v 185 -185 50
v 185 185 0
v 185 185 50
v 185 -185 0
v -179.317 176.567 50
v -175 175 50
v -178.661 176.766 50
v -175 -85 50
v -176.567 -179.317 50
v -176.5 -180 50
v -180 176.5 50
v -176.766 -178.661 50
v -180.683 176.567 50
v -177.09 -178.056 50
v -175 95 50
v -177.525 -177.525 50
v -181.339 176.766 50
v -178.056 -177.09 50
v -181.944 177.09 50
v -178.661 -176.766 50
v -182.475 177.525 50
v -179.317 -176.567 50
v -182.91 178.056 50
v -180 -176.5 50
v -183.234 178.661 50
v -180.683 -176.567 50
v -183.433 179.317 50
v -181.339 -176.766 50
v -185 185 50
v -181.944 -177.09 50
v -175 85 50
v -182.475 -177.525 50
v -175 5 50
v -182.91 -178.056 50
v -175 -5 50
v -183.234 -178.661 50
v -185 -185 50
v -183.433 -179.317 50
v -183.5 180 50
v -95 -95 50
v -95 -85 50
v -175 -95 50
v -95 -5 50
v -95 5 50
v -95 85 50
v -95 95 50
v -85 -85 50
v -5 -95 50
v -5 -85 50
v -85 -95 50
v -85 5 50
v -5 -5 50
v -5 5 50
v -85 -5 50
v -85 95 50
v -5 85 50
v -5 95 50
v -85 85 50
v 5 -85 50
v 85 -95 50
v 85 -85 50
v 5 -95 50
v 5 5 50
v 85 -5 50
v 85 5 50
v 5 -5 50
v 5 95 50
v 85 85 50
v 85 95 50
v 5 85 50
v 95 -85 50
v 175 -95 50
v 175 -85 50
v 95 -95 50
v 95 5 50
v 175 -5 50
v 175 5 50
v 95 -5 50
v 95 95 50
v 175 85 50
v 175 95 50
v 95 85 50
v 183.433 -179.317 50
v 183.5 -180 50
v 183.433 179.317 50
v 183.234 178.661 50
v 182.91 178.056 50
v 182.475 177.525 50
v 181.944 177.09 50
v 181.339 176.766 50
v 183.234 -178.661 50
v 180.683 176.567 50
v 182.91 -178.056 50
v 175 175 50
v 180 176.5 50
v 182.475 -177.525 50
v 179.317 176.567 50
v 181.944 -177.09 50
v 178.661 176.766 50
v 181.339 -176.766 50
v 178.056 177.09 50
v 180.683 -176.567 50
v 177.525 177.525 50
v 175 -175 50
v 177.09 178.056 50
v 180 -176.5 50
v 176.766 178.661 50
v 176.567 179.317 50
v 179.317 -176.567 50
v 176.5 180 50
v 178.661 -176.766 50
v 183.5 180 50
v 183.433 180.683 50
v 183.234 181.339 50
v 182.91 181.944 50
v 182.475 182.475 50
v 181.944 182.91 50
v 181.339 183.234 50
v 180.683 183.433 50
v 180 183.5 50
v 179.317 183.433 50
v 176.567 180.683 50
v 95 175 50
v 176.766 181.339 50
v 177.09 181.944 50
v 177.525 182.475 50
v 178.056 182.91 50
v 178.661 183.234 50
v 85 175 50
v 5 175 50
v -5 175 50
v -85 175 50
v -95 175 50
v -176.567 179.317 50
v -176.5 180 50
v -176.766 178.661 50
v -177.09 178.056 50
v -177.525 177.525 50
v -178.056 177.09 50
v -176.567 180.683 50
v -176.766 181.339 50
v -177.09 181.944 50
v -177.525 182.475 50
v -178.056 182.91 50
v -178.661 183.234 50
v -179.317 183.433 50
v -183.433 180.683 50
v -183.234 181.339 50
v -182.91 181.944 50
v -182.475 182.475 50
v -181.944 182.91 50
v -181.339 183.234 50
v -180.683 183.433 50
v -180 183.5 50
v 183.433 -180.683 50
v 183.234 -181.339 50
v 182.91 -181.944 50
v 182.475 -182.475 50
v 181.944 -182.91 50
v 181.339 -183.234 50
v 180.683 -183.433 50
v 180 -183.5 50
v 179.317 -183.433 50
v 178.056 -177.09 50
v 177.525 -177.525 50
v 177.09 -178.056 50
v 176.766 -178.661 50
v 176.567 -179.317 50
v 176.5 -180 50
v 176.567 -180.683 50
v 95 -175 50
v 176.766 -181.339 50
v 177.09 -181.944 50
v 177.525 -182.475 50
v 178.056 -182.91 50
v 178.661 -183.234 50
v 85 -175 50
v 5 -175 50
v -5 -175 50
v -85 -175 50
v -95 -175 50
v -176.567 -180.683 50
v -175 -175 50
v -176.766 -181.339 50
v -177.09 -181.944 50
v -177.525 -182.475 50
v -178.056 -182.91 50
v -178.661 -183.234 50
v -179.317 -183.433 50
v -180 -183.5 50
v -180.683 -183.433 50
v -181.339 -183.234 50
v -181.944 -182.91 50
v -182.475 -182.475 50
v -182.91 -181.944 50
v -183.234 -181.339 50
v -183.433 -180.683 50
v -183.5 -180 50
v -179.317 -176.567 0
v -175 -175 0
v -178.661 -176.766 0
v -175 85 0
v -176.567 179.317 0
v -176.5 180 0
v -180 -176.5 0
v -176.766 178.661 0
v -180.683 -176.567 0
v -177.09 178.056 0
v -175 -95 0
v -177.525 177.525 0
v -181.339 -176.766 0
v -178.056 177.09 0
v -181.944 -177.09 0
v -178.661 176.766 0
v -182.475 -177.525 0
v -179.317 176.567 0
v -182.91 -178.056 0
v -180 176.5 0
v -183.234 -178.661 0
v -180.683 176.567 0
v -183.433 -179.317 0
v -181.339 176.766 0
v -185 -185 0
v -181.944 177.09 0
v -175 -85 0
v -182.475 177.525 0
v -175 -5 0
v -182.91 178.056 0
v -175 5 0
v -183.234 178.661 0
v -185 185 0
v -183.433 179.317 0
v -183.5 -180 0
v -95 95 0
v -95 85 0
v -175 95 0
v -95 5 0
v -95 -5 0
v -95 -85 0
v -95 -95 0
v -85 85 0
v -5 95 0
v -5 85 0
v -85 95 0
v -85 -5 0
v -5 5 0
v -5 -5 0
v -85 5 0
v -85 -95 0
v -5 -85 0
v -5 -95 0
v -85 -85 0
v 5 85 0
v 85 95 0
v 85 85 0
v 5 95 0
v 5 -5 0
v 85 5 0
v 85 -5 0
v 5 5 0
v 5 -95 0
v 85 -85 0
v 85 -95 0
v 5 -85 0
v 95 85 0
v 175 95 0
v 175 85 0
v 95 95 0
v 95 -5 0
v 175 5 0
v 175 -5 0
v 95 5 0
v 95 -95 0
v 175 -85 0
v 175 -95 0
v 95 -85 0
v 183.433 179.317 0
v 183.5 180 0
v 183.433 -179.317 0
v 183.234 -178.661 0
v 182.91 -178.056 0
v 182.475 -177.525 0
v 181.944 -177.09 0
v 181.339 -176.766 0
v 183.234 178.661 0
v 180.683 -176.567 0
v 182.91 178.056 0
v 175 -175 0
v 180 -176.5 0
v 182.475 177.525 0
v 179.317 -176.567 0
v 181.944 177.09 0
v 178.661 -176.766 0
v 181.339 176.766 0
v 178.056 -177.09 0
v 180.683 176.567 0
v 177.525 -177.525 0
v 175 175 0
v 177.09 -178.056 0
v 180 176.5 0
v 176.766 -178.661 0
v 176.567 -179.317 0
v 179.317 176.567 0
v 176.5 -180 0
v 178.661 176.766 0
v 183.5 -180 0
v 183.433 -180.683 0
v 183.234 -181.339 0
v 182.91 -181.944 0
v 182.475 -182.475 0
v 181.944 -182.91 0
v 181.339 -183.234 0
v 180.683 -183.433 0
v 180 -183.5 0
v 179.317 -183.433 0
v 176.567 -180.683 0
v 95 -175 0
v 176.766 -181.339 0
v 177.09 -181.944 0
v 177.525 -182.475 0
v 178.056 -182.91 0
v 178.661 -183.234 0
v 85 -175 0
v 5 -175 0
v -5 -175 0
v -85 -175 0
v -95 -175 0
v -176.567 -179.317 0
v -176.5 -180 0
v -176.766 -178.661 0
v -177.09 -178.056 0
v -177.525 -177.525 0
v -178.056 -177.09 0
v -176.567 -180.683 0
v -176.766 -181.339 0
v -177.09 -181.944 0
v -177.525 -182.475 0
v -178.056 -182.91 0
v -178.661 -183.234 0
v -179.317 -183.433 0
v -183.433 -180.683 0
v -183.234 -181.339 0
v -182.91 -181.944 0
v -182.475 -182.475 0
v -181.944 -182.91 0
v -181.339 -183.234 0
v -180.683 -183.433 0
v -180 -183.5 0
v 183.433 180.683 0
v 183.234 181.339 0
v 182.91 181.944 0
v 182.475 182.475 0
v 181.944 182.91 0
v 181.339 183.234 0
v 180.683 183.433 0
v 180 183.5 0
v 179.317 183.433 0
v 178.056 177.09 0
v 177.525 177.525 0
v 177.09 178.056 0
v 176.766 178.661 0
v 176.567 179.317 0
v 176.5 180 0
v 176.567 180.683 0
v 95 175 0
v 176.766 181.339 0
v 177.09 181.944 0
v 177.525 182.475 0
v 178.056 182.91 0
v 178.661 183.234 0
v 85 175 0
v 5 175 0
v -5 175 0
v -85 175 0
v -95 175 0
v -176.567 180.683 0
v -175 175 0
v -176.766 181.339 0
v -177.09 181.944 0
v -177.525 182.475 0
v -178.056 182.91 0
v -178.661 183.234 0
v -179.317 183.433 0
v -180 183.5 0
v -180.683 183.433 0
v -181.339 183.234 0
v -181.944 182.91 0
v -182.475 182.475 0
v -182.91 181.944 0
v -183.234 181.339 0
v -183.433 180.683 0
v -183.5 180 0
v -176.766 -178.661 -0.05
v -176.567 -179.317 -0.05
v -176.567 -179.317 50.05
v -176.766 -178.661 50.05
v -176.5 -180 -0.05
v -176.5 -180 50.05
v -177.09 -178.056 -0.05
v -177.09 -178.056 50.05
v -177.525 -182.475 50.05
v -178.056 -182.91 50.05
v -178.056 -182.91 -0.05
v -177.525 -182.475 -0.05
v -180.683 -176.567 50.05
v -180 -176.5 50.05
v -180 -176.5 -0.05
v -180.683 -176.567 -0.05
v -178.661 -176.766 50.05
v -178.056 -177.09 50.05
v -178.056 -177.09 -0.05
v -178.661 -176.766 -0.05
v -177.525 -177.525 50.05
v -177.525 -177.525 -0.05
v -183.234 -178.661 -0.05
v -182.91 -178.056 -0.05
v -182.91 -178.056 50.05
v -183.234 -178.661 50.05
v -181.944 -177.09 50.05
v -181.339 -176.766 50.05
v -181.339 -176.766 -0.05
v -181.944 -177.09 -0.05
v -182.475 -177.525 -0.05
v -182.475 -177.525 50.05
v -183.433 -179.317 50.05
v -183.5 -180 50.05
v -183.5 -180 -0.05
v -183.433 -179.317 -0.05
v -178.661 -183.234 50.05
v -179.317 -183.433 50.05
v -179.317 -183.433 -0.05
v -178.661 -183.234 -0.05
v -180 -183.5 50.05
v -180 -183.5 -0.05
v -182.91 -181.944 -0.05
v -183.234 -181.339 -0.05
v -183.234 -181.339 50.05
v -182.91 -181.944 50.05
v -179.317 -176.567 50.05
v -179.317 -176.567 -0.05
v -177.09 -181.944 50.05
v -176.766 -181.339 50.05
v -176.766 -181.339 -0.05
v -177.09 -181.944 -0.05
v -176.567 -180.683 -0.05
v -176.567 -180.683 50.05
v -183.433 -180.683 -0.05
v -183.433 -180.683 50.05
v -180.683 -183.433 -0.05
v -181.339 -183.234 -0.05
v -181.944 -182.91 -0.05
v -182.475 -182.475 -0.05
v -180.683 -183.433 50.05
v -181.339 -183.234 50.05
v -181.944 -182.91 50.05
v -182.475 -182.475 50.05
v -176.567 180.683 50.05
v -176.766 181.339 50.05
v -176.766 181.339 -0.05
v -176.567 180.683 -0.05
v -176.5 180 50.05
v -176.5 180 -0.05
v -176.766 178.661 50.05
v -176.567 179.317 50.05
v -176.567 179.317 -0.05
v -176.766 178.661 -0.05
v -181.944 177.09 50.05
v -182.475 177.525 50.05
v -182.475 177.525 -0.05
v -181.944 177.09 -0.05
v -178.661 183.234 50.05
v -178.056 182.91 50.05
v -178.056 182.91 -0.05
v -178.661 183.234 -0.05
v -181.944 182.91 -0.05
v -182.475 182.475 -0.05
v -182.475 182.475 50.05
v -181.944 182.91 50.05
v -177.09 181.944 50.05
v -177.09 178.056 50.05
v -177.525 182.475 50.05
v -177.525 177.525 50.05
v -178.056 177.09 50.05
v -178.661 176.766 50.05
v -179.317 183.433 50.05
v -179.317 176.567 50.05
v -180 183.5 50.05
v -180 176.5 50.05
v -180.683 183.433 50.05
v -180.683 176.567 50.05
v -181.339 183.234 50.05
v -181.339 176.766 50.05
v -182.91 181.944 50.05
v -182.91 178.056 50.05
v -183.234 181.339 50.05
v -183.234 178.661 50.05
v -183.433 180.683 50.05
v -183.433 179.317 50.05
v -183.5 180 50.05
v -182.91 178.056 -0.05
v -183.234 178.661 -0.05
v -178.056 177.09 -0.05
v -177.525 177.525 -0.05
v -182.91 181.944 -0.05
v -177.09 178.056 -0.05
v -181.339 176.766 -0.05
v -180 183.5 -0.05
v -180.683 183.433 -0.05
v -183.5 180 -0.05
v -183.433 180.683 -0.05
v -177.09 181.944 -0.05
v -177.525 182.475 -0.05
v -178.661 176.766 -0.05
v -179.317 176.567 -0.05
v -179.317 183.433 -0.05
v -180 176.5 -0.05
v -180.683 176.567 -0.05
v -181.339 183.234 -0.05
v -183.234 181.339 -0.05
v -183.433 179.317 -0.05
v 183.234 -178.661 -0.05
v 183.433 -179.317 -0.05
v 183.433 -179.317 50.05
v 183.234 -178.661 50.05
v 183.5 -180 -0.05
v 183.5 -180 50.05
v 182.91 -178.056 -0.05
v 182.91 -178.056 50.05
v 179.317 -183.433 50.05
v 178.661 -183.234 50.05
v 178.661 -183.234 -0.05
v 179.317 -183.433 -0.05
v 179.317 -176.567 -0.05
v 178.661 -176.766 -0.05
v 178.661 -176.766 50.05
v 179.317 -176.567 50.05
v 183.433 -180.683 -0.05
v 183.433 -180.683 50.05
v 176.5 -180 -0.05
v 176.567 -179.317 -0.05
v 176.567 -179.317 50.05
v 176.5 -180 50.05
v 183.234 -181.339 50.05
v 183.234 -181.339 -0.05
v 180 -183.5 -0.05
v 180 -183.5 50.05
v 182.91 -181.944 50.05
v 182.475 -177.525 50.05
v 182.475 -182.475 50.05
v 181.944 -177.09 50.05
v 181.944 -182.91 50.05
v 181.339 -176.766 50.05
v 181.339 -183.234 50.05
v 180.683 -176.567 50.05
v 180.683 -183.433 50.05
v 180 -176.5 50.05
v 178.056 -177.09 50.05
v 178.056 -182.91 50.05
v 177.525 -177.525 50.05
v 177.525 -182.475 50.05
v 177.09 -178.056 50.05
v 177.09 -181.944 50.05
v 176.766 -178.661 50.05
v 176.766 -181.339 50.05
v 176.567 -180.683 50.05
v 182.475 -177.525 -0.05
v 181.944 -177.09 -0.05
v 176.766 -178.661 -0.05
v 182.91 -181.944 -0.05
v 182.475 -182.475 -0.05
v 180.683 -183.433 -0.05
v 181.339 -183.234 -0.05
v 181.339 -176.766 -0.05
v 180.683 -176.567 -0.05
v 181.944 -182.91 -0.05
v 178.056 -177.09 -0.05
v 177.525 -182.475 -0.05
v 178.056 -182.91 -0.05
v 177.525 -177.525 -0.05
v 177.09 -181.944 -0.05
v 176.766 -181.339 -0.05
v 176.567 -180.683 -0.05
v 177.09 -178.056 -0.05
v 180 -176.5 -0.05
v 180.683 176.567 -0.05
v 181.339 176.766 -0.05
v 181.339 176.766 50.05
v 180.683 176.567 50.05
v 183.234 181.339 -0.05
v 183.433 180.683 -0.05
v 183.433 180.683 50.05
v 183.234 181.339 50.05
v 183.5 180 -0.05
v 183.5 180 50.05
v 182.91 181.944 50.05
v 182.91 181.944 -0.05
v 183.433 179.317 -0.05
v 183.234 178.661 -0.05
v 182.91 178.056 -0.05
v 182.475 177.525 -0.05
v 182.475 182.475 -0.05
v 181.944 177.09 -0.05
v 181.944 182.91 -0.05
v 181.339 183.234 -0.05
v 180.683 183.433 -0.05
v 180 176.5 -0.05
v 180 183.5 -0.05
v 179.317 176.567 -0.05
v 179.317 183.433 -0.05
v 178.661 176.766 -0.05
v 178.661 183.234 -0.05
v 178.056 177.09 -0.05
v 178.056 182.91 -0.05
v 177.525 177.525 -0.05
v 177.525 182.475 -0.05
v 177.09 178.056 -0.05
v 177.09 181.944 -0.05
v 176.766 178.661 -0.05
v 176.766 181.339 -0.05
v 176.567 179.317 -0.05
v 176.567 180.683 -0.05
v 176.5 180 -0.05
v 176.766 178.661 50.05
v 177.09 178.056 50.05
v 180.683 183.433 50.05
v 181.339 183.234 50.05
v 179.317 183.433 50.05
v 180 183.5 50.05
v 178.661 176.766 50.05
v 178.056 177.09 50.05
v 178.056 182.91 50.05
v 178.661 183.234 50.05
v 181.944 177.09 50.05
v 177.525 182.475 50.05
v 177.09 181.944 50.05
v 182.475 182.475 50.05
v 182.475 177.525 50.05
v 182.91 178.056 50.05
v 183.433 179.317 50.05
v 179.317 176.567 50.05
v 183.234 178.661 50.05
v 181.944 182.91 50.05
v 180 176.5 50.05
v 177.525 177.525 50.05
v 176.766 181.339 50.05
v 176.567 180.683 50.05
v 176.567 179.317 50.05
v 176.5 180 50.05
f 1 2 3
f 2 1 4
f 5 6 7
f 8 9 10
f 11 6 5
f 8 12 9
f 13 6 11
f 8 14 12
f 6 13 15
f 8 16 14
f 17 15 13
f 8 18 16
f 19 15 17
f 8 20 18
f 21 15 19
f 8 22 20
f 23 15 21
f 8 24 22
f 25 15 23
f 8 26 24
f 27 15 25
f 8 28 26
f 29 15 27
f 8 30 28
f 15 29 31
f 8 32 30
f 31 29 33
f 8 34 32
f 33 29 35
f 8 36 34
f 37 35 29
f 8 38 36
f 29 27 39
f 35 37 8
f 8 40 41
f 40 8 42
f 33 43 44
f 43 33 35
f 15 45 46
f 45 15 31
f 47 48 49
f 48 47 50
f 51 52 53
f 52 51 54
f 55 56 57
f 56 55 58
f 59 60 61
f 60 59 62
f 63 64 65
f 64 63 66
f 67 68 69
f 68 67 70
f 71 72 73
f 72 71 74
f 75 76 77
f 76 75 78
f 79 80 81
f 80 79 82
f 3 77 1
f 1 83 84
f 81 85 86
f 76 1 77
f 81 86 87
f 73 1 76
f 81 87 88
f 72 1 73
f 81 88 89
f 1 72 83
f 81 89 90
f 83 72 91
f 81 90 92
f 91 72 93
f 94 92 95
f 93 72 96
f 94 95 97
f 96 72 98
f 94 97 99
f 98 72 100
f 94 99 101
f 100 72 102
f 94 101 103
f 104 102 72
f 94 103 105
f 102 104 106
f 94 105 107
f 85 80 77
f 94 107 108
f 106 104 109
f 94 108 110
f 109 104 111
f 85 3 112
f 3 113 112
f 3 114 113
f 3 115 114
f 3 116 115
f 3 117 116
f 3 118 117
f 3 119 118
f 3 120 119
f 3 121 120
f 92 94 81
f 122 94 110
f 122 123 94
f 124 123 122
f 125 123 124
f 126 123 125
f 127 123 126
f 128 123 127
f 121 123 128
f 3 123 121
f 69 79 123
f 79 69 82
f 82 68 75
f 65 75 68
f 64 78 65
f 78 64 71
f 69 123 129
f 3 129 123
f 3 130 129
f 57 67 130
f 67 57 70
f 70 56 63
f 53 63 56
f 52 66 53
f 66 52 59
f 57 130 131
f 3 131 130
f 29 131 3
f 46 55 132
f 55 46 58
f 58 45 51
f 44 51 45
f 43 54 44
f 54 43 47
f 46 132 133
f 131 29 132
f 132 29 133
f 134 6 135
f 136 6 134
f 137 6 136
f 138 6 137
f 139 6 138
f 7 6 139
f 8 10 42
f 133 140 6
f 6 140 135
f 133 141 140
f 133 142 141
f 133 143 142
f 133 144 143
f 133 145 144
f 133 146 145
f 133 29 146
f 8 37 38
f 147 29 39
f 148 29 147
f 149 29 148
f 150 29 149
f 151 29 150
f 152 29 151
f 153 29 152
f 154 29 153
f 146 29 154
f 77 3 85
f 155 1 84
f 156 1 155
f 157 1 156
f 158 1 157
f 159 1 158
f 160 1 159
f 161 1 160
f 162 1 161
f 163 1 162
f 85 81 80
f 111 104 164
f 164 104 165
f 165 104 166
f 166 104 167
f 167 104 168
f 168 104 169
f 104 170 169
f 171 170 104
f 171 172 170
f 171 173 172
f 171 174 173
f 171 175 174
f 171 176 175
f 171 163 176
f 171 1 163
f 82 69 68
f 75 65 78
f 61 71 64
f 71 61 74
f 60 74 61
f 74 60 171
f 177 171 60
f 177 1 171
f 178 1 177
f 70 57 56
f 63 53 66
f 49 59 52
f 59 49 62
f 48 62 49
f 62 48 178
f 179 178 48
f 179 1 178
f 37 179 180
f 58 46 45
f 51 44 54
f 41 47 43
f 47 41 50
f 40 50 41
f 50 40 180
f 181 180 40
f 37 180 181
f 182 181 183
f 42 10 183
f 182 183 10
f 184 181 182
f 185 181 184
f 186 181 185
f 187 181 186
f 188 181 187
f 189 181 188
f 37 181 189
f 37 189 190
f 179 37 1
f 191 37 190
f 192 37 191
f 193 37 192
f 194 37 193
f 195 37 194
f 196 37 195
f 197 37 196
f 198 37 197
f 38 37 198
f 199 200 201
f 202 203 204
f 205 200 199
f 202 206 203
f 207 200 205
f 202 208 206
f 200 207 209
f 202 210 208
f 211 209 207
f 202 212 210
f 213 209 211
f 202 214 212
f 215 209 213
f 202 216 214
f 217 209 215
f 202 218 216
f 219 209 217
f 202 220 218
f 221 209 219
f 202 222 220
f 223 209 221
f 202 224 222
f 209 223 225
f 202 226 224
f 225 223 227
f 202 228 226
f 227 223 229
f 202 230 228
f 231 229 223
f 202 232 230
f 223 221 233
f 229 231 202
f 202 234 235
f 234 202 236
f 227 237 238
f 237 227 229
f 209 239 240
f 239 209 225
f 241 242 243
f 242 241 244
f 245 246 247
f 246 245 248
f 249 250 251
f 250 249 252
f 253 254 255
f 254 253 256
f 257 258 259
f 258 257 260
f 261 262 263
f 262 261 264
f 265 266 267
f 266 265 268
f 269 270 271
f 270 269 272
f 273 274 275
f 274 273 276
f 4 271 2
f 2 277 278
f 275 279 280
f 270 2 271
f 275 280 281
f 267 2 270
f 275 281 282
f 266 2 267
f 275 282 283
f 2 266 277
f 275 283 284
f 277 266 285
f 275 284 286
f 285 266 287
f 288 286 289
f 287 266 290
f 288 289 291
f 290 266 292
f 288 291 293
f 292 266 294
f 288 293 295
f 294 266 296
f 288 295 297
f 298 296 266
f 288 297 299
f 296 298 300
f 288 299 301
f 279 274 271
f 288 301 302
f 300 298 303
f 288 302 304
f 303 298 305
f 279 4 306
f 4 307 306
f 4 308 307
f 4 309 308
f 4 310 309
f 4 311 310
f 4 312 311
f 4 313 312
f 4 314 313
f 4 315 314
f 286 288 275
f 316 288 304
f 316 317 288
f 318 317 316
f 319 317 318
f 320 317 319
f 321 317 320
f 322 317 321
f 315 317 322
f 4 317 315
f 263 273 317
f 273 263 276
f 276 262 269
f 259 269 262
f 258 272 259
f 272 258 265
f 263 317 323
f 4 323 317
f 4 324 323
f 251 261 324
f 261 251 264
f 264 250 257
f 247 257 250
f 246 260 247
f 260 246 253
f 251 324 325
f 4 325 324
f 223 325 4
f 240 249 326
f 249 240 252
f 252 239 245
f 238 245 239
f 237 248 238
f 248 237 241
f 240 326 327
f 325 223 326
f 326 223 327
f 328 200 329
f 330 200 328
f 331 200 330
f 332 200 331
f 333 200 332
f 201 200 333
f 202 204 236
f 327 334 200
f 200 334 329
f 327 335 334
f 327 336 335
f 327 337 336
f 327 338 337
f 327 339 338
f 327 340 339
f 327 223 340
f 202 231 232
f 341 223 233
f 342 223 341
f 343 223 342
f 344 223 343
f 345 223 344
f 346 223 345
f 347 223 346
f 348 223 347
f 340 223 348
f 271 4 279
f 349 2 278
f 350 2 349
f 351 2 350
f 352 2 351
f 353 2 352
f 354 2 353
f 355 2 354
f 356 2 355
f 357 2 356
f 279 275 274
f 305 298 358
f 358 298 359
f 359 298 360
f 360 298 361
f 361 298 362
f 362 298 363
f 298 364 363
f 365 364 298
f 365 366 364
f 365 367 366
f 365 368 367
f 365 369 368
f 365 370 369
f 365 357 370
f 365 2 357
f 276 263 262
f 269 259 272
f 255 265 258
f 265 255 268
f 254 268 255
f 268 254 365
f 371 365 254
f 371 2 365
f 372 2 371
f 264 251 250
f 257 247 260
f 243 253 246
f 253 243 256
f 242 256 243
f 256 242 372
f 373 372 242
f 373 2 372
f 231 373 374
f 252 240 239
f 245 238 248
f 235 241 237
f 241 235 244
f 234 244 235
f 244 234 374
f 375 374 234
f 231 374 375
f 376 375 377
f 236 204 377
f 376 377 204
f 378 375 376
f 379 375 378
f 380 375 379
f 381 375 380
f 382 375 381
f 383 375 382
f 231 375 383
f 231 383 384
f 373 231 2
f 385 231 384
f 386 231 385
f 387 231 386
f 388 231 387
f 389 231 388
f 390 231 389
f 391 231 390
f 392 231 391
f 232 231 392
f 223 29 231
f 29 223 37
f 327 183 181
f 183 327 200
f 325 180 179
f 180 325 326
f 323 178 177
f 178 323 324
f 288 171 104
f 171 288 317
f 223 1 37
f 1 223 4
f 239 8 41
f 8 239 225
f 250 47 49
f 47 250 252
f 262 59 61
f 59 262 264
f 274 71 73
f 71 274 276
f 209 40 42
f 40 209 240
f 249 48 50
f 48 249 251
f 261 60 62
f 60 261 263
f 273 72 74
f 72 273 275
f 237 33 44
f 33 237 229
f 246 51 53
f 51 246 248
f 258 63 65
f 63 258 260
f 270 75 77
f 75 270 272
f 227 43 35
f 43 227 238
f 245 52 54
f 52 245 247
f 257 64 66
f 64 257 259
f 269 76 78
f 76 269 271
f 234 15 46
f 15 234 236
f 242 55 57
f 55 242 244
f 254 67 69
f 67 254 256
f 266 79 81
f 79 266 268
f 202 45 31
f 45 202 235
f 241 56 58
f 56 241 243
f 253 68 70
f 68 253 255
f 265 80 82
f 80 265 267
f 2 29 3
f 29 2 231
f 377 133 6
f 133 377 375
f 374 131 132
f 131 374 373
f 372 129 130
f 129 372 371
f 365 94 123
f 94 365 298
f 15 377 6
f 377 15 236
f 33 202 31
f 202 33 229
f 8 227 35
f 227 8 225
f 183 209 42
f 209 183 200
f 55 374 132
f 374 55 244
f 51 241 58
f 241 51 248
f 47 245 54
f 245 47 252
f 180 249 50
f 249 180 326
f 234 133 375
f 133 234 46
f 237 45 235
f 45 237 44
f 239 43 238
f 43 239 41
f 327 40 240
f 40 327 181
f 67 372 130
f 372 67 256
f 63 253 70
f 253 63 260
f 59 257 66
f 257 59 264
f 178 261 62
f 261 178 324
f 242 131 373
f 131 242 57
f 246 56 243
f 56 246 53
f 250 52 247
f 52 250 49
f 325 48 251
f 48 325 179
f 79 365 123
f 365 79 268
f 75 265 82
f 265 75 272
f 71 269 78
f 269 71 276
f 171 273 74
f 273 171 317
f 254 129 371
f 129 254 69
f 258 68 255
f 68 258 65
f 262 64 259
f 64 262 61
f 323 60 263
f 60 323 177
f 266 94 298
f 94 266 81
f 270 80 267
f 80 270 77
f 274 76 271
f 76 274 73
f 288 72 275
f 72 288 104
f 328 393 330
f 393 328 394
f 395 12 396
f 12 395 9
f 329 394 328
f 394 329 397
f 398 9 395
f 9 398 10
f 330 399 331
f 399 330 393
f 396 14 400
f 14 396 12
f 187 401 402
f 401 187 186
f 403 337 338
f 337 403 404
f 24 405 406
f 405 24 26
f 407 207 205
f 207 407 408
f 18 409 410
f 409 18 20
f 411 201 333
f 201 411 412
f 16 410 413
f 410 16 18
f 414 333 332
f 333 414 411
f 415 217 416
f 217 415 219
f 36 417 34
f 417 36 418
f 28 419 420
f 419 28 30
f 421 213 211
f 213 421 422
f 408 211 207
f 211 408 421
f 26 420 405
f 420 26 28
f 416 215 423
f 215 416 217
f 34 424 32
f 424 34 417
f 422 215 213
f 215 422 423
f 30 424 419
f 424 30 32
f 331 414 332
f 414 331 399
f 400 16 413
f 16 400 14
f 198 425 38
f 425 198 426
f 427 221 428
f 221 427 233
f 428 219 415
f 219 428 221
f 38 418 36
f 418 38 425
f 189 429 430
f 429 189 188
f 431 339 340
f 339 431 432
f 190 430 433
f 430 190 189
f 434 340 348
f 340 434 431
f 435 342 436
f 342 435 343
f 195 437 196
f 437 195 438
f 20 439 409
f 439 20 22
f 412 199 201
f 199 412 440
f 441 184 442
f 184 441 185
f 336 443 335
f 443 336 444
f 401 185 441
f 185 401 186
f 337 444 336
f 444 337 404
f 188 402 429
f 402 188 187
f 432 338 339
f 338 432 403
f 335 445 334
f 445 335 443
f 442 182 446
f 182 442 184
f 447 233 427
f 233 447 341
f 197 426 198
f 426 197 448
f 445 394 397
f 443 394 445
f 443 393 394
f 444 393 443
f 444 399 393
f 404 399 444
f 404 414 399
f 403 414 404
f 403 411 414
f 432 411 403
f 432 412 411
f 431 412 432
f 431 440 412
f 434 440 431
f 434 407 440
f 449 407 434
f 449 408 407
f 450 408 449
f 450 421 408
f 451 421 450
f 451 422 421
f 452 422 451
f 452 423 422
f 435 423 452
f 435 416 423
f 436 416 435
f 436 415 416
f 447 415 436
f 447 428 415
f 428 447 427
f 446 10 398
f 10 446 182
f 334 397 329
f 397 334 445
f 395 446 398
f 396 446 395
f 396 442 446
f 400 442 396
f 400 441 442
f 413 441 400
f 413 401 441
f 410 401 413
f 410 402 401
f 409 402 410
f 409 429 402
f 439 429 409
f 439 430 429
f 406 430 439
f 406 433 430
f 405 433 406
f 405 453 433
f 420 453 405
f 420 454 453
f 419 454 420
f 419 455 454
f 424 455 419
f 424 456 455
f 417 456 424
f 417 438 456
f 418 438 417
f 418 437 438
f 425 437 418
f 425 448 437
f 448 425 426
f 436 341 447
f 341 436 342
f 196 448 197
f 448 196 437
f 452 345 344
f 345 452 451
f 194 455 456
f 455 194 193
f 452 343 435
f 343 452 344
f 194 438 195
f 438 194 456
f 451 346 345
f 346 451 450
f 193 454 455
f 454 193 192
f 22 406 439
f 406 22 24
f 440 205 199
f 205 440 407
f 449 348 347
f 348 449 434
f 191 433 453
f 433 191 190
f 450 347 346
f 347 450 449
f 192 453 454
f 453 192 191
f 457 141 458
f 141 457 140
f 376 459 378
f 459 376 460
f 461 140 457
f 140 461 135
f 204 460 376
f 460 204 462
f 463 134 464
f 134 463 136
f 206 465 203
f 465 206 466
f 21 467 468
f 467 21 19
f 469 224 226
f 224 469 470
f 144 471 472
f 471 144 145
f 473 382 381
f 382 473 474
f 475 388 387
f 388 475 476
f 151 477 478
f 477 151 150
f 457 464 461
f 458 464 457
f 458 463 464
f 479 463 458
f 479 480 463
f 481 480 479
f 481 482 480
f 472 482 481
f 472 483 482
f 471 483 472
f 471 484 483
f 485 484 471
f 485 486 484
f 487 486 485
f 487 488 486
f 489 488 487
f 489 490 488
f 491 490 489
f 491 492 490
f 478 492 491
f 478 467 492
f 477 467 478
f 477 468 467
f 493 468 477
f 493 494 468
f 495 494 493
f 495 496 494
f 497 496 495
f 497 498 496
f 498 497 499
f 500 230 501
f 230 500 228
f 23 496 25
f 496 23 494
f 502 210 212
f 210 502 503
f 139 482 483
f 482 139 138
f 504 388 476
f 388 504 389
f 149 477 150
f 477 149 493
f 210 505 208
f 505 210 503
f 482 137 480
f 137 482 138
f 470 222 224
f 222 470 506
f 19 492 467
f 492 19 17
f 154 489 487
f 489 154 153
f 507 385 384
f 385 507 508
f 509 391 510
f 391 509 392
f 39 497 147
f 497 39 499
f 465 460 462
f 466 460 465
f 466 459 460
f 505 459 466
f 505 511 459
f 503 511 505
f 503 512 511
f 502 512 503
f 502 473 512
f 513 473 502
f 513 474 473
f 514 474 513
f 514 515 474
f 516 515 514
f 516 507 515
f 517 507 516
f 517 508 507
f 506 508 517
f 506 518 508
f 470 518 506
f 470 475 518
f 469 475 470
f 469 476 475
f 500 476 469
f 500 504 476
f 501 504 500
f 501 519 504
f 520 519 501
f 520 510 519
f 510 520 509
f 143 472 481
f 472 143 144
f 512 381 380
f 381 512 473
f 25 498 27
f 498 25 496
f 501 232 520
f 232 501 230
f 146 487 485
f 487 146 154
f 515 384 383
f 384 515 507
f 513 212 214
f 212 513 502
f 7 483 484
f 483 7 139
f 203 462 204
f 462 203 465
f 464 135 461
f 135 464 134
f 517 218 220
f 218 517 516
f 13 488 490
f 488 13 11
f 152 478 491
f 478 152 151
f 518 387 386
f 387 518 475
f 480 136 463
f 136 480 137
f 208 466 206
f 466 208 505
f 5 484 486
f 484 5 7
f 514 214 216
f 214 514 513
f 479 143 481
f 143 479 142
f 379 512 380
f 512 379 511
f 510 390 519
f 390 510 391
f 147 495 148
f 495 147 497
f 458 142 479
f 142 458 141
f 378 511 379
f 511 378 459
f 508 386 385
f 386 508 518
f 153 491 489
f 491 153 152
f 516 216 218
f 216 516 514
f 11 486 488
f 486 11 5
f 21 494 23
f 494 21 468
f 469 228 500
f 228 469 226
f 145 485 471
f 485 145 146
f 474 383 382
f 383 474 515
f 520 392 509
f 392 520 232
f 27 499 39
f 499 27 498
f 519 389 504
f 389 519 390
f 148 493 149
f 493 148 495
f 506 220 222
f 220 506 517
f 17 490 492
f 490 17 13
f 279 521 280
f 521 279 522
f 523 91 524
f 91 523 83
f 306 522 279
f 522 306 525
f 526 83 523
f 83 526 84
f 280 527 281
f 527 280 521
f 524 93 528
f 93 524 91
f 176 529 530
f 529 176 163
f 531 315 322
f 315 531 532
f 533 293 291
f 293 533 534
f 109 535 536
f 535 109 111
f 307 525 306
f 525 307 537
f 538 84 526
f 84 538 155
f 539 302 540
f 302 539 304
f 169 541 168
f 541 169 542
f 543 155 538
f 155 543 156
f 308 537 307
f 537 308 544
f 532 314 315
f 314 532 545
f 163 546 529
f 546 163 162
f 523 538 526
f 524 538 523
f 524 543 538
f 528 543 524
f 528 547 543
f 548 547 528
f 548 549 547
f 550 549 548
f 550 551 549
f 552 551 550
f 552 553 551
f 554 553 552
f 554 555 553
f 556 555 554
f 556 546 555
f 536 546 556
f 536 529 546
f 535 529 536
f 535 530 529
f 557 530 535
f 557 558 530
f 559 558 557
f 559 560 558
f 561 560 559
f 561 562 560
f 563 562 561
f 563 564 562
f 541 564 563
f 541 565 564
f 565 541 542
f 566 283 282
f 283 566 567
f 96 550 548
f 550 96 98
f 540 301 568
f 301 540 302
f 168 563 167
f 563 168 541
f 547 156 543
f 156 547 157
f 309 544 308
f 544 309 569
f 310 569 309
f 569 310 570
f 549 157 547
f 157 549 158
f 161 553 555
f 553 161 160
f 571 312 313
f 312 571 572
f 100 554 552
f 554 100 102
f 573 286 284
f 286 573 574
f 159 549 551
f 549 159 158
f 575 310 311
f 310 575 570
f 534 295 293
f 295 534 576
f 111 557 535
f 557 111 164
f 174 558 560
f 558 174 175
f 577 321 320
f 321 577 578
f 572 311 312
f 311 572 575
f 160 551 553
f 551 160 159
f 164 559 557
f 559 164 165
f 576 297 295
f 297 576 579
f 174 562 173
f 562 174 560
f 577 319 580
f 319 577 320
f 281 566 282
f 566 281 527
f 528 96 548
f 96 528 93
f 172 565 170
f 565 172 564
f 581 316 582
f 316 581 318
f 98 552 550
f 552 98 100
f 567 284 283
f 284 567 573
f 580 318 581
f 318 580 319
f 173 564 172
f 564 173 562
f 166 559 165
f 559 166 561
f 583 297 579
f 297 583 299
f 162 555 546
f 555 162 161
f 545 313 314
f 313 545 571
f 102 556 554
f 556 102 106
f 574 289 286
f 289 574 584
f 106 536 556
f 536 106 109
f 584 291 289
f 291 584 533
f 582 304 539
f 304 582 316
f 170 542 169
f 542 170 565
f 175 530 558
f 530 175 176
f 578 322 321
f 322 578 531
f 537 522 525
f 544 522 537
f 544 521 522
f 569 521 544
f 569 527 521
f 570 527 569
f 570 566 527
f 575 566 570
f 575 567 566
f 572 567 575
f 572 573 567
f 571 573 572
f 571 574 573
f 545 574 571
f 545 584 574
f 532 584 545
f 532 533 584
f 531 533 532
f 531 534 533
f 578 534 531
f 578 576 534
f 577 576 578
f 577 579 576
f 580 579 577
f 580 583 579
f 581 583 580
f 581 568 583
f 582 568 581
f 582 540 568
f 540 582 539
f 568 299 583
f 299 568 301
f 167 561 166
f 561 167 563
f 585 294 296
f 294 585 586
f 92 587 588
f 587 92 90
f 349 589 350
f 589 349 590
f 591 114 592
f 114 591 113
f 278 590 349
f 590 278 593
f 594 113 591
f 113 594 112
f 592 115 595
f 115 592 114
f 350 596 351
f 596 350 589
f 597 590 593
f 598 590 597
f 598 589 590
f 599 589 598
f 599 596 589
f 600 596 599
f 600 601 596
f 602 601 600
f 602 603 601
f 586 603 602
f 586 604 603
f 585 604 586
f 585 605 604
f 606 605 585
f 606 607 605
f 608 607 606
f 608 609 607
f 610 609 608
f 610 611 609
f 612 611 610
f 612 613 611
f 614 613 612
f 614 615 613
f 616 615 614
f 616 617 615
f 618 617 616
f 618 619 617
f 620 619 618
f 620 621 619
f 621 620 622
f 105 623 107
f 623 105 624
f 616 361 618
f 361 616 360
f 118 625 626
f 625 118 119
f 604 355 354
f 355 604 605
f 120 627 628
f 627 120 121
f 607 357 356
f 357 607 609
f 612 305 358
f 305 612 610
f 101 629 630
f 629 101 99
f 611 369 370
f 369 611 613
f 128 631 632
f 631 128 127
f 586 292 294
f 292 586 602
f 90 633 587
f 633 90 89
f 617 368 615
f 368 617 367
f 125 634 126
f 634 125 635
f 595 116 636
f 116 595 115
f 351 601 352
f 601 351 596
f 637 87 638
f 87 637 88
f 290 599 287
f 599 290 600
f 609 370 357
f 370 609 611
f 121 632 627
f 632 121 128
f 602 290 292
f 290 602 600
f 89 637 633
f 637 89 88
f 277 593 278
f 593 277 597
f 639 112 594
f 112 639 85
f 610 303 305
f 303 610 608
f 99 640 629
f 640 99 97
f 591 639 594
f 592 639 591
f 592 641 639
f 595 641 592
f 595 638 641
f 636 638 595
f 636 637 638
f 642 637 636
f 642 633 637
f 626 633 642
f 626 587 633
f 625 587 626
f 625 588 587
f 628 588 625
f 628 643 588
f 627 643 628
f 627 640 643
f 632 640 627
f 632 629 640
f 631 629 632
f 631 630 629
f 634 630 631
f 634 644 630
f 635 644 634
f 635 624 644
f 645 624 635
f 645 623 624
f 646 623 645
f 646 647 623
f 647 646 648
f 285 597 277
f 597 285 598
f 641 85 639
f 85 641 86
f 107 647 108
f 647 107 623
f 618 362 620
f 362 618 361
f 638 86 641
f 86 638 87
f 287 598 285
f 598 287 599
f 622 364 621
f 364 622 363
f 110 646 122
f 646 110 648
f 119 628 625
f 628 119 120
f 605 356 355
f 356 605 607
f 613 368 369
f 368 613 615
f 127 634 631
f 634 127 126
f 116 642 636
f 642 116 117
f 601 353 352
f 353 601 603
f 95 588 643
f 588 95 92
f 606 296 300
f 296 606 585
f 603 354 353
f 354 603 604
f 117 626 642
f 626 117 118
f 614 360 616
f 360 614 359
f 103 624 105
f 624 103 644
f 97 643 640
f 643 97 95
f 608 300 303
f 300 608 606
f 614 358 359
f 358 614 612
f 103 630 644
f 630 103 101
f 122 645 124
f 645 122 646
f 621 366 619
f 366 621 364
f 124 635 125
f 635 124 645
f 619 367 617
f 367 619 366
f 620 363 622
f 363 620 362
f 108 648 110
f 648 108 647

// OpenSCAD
// Part Name: Cage_Layer_9_H50mm
// This part represents a horizontal slice of the cage.
// It is designed to be 3D printed on its base.

// Parameters for the cage
bar_t = 10;
gap_xy = 80;
hole_d = 7;
cage_ext_xy = 370;

// Calculate bar center positions relative to the overall cage center
bar_centers_xy = [for (j = [0:4]) (-cage_ext_xy/2 + bar_t/2 + j * (bar_t + gap_xy))];

// Module to generate a single layer segment
module cage_layer_segment(height) {
    // Offset for printing on z=0 plane. The module itself is centered on XY=0, so this Z offset moves its base to Z=0.
    translate([0, 0, height/2]) {
        union() {
            // Horizontal bars (along X)
            for (y_center = bar_centers_xy) {
                translate([0, y_center, 0])
                cube([cage_ext_xy, bar_t, height], center = true);
            }

            // Vertical bars (along Y)
            for (x_center = bar_centers_xy) {
                translate([x_center, 0, 0])
                cube([bar_t, cage_ext_xy, height], center = true);
            }

            // Subtract holes for M6 rods at the 4 corners
            corner_offsets_xy = [bar_centers_xy[0], bar_centers_xy[4]];

            for (x_offset = corner_offsets_xy) {
                for (y_offset = corner_offsets_xy) {
                    // Hole through the center of the corner bar
                    translate([x_offset, y_offset, 0])
                    cylinder(h = height + 0.1, d = hole_d, center = true, $fn=32); // +0.1 for clean cut
                }
            }
        }
    }
}

// Render the segment
cage_layer_segment(50);
